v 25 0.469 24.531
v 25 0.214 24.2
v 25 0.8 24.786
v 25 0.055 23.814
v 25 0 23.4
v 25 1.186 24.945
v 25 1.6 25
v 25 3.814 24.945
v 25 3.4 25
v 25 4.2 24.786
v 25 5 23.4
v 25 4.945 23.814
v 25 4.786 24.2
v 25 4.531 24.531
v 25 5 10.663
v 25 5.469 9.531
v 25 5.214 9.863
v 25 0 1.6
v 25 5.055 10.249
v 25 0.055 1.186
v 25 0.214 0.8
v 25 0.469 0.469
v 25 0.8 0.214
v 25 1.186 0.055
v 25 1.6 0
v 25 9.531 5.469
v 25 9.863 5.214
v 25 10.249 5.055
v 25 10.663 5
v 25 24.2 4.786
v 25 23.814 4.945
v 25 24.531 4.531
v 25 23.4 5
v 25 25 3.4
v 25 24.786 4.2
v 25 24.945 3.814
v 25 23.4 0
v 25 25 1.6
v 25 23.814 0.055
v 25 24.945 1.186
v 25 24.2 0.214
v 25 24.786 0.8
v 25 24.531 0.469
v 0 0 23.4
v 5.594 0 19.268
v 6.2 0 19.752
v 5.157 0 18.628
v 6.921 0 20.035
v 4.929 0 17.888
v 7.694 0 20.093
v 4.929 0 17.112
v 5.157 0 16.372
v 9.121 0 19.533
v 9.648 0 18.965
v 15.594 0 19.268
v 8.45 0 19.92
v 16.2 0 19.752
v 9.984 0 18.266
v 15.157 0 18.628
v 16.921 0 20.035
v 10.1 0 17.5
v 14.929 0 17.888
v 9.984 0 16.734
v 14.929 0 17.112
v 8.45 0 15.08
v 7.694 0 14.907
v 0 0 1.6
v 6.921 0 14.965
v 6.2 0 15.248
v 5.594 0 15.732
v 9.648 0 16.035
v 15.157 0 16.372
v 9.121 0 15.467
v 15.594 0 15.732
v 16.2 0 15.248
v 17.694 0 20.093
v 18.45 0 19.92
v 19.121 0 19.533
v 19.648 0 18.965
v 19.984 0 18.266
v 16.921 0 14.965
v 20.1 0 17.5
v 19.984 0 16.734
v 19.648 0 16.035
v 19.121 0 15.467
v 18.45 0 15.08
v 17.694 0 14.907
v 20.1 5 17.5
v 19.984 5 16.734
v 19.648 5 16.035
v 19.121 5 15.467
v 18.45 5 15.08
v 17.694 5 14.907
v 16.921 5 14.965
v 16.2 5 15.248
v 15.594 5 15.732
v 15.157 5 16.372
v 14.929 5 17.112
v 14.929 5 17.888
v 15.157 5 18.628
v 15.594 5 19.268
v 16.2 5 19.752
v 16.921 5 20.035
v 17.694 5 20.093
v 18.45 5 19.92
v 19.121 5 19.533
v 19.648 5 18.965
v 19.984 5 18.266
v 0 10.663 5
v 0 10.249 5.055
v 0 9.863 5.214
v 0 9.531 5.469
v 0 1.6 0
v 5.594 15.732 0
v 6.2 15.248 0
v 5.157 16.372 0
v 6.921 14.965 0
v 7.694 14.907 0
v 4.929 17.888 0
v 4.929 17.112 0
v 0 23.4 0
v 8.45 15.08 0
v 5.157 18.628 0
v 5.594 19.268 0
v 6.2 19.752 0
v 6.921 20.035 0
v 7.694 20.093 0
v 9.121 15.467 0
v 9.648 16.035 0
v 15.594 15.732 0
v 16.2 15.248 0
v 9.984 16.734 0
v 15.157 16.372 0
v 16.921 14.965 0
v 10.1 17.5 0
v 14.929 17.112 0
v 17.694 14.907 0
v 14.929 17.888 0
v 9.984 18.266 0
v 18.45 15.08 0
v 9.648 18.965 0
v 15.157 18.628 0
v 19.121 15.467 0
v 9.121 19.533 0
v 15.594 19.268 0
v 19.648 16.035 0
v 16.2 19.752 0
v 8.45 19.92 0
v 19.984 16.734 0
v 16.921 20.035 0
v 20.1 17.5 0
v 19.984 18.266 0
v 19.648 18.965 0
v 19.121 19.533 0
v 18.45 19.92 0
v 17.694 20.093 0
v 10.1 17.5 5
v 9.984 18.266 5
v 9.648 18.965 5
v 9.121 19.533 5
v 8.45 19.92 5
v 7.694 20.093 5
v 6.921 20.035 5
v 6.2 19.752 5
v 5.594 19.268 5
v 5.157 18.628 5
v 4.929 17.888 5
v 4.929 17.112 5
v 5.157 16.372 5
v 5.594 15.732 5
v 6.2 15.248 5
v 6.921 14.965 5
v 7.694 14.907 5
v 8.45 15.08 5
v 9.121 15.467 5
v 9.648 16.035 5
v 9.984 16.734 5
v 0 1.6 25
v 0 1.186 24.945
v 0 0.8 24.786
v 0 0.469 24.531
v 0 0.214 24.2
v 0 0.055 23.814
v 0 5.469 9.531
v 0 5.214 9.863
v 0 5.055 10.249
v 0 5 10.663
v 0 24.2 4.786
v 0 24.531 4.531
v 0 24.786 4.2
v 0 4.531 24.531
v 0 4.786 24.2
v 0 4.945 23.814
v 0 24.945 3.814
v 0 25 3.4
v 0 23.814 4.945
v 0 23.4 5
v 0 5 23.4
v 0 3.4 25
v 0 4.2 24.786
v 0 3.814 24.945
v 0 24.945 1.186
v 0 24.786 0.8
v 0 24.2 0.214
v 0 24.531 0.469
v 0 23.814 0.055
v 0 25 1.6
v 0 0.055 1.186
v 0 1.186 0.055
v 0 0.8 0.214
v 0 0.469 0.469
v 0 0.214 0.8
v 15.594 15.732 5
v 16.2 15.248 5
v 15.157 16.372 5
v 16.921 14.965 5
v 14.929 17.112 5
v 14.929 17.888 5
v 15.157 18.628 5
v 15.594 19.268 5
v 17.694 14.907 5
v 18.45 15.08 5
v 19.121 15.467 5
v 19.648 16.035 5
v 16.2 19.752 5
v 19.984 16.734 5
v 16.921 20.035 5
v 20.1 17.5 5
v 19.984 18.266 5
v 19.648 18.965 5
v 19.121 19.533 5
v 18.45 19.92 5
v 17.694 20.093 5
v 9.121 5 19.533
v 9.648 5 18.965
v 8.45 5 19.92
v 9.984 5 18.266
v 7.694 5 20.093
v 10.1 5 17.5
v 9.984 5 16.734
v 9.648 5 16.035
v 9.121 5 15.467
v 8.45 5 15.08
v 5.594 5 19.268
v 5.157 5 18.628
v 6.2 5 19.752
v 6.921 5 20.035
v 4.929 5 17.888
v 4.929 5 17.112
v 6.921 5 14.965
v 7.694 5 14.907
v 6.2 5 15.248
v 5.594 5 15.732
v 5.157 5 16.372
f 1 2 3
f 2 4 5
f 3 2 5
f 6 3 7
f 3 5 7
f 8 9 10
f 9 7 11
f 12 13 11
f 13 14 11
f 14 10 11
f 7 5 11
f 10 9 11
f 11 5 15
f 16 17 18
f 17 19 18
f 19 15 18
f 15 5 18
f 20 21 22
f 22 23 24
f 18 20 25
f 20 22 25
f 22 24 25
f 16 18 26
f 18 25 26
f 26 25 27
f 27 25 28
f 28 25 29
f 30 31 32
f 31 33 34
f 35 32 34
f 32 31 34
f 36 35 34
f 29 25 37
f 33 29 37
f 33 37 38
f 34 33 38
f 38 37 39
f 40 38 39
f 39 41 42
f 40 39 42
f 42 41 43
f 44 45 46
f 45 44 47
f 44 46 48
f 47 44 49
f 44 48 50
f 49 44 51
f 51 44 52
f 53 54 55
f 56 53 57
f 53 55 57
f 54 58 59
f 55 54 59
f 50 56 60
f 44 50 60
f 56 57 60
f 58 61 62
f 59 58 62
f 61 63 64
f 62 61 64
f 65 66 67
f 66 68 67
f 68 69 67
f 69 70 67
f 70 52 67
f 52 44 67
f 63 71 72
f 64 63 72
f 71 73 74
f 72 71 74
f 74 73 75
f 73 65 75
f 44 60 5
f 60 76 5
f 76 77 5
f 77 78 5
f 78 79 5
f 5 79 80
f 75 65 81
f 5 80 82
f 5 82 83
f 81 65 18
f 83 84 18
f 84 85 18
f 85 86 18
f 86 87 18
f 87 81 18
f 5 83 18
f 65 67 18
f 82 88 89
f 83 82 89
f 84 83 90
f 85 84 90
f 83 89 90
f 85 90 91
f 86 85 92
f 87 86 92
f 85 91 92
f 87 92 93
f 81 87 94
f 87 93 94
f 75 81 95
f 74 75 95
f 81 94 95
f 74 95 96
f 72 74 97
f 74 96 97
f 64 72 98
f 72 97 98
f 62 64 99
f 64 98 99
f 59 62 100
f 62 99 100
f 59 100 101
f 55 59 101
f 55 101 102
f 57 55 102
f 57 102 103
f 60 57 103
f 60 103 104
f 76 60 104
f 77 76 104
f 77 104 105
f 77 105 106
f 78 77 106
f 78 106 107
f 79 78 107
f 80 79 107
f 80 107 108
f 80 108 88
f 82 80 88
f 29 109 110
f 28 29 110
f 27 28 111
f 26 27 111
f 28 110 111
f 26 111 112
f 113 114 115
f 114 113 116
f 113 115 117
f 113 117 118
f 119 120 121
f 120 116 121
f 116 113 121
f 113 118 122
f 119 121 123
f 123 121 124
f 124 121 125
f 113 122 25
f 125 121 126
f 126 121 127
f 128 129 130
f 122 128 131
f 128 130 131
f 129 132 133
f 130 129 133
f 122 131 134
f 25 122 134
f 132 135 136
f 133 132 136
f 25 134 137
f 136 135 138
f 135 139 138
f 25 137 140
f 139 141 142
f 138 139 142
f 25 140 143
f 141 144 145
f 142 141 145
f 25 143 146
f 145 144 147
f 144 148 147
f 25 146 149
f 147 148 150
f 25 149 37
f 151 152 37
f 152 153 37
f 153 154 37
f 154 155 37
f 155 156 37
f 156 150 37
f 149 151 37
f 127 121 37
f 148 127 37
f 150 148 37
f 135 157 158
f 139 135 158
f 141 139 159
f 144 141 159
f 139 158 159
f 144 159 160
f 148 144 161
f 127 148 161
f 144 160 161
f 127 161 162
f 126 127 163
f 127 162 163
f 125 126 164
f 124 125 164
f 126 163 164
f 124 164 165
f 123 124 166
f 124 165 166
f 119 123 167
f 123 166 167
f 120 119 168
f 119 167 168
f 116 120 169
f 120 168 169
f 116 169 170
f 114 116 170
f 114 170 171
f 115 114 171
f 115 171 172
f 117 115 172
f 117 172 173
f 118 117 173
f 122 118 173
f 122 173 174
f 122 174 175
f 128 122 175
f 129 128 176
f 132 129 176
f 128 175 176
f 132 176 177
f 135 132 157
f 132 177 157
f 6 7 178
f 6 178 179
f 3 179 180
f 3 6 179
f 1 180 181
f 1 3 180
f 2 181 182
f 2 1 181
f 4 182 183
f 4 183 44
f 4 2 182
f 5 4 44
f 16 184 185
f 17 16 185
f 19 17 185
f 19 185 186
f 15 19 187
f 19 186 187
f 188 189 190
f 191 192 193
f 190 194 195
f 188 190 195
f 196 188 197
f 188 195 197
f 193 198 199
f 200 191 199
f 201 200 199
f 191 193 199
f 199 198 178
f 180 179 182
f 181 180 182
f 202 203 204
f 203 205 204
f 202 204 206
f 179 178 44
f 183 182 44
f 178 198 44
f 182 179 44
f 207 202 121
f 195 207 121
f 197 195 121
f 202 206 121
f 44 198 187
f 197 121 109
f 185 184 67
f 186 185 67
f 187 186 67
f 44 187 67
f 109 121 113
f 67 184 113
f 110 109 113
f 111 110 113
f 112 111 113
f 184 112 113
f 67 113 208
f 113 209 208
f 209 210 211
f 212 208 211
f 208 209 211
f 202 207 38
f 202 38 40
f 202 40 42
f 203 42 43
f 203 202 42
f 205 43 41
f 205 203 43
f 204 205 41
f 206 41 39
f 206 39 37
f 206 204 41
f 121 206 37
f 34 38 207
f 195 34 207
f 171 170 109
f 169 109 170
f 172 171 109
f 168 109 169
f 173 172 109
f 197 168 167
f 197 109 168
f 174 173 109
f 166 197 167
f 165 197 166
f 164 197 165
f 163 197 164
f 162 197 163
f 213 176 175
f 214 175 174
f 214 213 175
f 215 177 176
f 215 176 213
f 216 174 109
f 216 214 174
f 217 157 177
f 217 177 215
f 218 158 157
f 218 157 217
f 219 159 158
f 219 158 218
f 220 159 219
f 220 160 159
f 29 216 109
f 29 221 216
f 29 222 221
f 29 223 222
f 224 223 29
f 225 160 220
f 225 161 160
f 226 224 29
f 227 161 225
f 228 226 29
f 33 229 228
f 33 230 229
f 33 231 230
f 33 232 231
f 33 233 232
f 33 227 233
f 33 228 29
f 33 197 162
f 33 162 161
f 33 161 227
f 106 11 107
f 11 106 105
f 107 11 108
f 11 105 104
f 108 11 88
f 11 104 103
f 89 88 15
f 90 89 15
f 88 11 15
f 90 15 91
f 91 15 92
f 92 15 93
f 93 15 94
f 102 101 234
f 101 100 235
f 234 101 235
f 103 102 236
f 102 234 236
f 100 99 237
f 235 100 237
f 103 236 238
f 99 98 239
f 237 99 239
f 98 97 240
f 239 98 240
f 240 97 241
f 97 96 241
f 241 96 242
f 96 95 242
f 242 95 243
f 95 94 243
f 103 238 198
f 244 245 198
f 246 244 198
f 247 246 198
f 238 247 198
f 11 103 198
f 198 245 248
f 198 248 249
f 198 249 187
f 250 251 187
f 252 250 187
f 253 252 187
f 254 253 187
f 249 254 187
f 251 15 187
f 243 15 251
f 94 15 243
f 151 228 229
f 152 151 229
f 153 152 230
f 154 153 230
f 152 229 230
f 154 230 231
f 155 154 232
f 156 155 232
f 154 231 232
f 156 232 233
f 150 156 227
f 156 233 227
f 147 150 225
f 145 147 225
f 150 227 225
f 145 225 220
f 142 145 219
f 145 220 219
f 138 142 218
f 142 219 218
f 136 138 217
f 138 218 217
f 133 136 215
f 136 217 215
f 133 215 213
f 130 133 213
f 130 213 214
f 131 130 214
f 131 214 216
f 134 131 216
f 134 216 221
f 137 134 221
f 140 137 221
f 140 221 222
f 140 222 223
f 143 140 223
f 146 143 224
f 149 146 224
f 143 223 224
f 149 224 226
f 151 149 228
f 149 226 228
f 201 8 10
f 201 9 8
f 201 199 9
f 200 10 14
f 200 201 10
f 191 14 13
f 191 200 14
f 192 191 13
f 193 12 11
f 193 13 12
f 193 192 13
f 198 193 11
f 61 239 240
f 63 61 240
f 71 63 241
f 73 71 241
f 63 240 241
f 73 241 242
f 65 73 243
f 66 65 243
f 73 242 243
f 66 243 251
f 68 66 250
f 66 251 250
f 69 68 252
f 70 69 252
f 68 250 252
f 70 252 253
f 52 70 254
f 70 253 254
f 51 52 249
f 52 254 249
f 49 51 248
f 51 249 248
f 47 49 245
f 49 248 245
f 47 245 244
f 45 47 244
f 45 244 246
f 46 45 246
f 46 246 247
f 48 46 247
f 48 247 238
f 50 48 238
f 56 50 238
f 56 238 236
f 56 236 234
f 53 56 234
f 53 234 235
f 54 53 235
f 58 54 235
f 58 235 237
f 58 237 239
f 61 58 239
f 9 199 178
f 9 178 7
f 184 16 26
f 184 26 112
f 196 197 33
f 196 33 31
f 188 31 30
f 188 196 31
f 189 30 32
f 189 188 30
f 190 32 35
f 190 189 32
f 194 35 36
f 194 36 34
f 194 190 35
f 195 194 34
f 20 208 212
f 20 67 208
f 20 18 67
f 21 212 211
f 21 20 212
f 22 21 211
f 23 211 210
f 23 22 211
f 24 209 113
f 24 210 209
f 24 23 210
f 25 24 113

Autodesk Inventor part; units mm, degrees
ref_plane "YZ Plane" through (0, 0, 0) normal (1, 0, 0) x (0, 1, 0)
ref_plane "XZ Plane" through (0, 0, 0) normal (0, 1, 0) x (-1, 0, 0)
ref_plane "XY Plane" through (0, 0, 0) normal (0, 0, 1) x (1, 0, 0)
sketch "Szkic1" plane through (0, 0, 0) normal (0, 0, 1) x (1, 0, 0)
  line L0 (0, 0) -> (25, 0)
  line L1 (25, 0) -> (25, 5)
  line L2 (25, 5) -> (0, 5)
  line L3 (0, 5) -> (0, 0)
  line L4 (0, 5) -> (25, 5)
  line L5 (25, 5) -> (25, 25)
  line L6 (25, 25) -> (0, 25)
  line L7 (0, 25) -> (0, 5)
  dimension "d0" = 5
  dimension "d1" = 25
  dimension "d2" = 20
extrude "Wyciągnięcie proste1" add sketch "Szkic1" along normal blind 5 contours L7 L6 L5 L2
extrude "Wyciągnięcie proste2" add sketch "Szkic1" along normal blind 25 contours L3 L2 L1 L0
chamfer "Faza1" distance 5 angle 45 1 edges at (12.5, 5, 5)
sketch "Szkic2" plane through (0, 5, 25) normal (0, 1, 0) x (1, 0, 0)
  line L0 (0, 15) -> (25, 15) projected
  line L1 (0, 15) -> (0, 0) projected
  line L2 (25, 0) -> (0, 0) projected
  line L3 (25, 15) -> (25, 0) projected
  line L4 (25, 0) -> (0, 0) projected
  line L5 (12.5, 0) -> (12.5, 15)
  circle A0 centre (7.5, 7.5) radius 2.6
  circle A1 centre (17.5, 7.5) radius 2.6
  point P0 (0, 25)
  dimension "d10" = 5.2
  dimension "d11" = 10
  dimension "d12" = 7.5
  dimension "d21" = 15
extrude "Wyciągnięcie proste3" cut sketch "Szkic2" against normal up to surface (5 mm away) contours A0 | A1
sketch "Szkic3" plane through (0, 0, 5) normal (0, 0, 1) x (1, 0, 0)
  line L0 (25, 10) -> (0, 10) projected
  line L1 (25, 10) -> (25, 25) projected
  line L2 (25, 25) -> (0, 25) projected
  line L3 (0, 25) -> (0, 10) projected
  circle A0 centre (17.5, 17.5) radius 2.6
  circle A1 centre (7.5, 17.5) radius 2.6
  line L4 (25, 25) -> (0, 25) projected
  line L5 (12.5, 25) -> (12.5, 10)
  point P0 (0, 0)
  dimension "d15" = 5.2
  dimension "d16" = 10
  dimension "d20" = 7.5
  dimension "d22" = 15
extrude "Wyciągnięcie proste4" cut sketch "Szkic3" against normal up to surface (5 mm away) contours A0 | A1
fillet "Zaokrąglenie1" radius 1.6 7 edges at (12.5, 0, 0) (12.5, 0, 25) (12.5, 5, 25) (12.5, 5, 10) (12.5, 10, 5) (12.5, 25, 5) (12.5, 25, 0)
equation "\"d12\" = 0.5 * d21"
equation "\"d20\" = 0.5 * d22"
properties part number "motor_rig_v2"
